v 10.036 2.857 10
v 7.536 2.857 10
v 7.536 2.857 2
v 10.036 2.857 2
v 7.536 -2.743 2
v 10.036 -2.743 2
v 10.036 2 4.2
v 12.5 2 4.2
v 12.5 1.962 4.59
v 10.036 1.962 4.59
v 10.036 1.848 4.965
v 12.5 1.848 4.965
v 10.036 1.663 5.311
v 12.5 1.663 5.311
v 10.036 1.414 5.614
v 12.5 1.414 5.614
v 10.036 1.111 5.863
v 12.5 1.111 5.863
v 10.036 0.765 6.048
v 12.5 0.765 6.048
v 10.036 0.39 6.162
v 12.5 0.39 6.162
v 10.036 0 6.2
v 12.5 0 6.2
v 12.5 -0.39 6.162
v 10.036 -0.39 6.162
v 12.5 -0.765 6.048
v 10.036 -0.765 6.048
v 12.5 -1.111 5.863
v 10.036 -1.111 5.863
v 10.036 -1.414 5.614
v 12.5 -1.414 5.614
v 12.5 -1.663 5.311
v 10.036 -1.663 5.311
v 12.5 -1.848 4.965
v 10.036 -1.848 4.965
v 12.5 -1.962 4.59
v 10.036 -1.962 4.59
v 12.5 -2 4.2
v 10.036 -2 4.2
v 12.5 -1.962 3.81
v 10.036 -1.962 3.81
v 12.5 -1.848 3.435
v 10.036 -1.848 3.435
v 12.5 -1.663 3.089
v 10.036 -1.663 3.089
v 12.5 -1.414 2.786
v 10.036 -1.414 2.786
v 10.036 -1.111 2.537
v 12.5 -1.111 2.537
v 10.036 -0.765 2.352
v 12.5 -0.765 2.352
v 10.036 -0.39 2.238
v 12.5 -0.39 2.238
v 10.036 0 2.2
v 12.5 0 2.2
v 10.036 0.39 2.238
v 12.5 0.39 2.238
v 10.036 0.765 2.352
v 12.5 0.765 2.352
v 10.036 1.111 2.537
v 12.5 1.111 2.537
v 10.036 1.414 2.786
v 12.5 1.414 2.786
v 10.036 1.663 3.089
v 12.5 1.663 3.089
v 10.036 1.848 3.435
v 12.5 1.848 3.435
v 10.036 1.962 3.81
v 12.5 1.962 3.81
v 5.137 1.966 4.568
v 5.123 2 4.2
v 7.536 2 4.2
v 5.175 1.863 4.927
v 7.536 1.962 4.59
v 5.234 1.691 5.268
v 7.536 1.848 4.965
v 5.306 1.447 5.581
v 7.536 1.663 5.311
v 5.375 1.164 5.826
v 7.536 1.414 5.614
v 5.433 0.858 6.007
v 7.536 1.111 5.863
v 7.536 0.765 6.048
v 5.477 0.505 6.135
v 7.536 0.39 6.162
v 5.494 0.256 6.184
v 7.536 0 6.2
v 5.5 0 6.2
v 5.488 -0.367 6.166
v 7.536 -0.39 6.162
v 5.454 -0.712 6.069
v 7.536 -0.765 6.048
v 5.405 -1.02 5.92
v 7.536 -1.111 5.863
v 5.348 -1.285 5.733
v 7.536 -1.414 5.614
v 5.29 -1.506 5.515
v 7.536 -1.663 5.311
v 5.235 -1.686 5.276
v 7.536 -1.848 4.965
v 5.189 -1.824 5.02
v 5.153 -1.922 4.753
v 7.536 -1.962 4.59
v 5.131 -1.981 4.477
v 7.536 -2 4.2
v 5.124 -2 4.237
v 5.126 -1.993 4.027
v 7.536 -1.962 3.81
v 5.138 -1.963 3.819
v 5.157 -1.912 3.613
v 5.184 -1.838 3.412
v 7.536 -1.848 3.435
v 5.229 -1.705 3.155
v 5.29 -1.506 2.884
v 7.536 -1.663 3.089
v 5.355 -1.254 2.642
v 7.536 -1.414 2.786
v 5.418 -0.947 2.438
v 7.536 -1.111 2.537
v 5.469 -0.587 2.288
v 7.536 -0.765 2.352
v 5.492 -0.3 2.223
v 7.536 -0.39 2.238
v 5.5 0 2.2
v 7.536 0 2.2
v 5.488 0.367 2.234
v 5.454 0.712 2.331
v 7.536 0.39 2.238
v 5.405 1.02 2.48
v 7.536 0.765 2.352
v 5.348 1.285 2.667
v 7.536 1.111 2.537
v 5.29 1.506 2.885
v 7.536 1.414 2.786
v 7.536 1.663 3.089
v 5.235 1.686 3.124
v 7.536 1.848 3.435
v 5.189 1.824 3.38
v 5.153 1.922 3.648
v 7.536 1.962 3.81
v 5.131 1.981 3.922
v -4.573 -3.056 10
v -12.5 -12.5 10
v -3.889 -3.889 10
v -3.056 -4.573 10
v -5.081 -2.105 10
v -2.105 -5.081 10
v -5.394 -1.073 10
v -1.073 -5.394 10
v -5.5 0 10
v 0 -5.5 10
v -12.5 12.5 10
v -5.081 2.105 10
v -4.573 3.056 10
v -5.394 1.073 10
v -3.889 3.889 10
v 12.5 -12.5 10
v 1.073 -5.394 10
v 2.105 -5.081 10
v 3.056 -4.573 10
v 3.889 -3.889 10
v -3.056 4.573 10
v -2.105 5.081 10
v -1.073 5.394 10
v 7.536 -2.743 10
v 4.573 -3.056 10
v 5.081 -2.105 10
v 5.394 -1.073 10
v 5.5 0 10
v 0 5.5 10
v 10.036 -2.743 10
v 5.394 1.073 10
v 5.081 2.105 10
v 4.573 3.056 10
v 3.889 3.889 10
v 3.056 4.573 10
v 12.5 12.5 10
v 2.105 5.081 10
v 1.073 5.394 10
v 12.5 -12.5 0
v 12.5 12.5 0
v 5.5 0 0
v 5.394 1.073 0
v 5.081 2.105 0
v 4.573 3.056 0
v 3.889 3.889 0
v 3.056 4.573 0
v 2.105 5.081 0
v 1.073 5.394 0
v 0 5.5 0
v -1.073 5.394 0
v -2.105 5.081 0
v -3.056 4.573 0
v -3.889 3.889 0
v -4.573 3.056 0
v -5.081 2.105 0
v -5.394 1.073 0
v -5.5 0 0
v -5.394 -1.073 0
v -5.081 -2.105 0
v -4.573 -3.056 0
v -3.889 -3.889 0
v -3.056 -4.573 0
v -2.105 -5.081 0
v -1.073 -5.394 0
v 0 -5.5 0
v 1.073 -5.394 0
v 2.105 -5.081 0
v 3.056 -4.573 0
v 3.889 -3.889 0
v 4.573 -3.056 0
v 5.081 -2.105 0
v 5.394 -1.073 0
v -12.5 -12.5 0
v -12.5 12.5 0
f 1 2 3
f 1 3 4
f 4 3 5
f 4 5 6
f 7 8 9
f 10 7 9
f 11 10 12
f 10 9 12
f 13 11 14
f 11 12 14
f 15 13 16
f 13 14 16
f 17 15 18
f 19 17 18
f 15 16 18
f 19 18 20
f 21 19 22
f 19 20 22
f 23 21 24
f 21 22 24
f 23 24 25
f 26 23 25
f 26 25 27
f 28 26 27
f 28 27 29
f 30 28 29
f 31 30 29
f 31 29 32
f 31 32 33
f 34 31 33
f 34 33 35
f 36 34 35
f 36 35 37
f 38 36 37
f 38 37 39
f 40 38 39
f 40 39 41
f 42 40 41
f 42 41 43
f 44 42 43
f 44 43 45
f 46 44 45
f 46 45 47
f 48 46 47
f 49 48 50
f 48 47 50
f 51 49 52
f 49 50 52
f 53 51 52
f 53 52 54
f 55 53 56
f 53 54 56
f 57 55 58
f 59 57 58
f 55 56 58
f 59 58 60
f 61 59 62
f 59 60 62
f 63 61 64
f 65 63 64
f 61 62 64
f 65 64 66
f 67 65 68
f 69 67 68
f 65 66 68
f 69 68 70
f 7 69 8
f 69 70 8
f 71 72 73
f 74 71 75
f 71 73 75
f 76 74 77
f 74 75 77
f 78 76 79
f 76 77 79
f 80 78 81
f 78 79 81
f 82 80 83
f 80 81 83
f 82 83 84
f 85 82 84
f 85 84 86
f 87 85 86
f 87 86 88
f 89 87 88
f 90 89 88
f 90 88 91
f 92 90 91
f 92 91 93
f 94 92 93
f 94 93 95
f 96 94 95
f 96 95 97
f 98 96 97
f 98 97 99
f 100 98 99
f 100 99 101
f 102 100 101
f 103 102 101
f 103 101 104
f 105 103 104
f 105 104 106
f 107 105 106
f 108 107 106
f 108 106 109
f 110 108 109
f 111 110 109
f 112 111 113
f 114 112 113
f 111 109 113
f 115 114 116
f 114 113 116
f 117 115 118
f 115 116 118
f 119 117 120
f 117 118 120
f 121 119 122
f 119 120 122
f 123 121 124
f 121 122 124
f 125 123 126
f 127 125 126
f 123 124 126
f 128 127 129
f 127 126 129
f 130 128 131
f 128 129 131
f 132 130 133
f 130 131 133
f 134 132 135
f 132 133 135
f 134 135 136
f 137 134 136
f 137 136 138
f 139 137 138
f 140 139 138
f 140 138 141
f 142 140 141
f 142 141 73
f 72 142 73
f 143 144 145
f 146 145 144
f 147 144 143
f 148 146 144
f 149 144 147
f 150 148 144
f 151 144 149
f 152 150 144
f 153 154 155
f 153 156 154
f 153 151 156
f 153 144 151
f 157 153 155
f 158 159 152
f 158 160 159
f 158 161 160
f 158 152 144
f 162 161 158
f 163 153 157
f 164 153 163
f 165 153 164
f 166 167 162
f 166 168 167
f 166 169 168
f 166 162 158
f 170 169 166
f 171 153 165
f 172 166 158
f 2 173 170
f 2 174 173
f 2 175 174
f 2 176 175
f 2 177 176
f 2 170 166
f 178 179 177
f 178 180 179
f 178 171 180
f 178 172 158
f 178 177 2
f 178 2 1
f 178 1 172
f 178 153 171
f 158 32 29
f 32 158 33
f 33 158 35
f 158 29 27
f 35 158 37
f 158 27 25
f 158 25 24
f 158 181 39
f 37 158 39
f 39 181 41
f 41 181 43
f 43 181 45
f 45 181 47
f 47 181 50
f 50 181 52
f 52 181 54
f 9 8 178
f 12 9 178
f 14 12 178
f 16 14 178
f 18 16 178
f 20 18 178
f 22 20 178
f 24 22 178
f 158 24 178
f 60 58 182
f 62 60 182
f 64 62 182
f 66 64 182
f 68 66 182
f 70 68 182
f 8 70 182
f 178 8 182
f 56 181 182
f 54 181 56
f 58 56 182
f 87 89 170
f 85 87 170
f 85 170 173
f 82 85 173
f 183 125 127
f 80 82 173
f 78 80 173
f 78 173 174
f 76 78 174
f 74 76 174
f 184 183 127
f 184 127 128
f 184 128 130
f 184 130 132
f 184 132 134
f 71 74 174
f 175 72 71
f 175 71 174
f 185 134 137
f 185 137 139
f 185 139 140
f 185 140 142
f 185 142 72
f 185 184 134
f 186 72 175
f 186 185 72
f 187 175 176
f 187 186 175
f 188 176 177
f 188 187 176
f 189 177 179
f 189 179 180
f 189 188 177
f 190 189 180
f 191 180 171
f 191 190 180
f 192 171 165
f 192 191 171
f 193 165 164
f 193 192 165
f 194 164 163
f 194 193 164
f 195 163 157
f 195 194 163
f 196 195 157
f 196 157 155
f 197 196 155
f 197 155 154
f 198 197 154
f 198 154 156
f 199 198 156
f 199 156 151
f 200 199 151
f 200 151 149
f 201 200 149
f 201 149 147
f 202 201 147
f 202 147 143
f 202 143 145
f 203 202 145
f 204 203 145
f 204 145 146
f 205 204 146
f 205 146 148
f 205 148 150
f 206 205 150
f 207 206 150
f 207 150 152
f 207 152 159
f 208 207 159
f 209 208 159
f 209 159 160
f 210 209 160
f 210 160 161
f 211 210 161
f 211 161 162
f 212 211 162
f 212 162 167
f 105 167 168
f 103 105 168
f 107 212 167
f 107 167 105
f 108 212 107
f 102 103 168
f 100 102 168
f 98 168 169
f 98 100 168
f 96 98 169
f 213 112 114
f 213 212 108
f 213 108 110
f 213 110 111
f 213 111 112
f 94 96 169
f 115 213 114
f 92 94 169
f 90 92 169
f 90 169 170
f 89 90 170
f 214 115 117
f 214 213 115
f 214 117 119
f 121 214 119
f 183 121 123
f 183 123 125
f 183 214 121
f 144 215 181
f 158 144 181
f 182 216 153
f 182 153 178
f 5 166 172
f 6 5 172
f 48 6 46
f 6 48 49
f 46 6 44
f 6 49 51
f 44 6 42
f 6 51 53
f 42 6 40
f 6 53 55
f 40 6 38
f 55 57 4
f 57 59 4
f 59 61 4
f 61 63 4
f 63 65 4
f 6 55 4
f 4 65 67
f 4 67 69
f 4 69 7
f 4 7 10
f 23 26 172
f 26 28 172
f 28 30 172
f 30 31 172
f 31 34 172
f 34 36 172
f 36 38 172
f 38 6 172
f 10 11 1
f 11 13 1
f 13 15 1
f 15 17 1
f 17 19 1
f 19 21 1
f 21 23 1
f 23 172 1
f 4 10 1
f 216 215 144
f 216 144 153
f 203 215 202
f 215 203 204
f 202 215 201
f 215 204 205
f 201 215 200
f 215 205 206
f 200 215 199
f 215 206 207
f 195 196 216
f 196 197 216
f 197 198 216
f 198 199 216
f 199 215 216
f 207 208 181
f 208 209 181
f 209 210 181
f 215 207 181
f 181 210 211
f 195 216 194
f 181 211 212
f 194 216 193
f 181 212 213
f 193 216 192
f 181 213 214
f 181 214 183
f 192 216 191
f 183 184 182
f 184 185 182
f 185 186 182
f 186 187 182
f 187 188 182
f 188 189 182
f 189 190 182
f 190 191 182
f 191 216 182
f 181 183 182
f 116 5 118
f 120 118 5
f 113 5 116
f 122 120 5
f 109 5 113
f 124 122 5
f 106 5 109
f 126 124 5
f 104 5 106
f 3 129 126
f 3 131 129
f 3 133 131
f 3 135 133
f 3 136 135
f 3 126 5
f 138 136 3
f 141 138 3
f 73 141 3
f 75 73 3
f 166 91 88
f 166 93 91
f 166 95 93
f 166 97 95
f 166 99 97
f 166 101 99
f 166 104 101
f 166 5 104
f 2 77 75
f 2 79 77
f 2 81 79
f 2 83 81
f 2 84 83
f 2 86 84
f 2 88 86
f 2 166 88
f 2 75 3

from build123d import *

# Parameters (mm, degrees)
SKETCH_W        = 25
SKETCH_H        = 25
SKETCH_R        = 5.5
PAD_DEPTH       = 10
SKETCH001_R     = 2
POCKET_DEPTH    = 8
SKETCH002_W     = 2.5
SKETCH002_H     = 5.6
POCKET001_DEPTH = 8


with BuildPart() as part:
    # Sketch → Pad (new body)
    with BuildSketch(Plane.XY):
        Rectangle(SKETCH_W, SKETCH_H)
        Circle(SKETCH_R, mode=Mode.SUBTRACT)
    extrude(amount=PAD_DEPTH)

    # Sketch001 (on Face2 of Pad) → Pocket (cut)
    with BuildSketch(Plane.YZ.offset(12.5)):
        with Locations((0, 4.2)):
            Circle(SKETCH001_R)
    extrude(amount=-POCKET_DEPTH, mode=Mode.SUBTRACT)

    # Sketch002 (on Face5 of Pocket) → Pocket001 (cut)
    with BuildSketch(Plane.XY.offset(10)):
        with Locations((8.785911, 0.057076)):
            Rectangle(SKETCH002_W, SKETCH002_H)
    extrude(amount=-POCKET001_DEPTH, mode=Mode.SUBTRACT)


solid = part.part
